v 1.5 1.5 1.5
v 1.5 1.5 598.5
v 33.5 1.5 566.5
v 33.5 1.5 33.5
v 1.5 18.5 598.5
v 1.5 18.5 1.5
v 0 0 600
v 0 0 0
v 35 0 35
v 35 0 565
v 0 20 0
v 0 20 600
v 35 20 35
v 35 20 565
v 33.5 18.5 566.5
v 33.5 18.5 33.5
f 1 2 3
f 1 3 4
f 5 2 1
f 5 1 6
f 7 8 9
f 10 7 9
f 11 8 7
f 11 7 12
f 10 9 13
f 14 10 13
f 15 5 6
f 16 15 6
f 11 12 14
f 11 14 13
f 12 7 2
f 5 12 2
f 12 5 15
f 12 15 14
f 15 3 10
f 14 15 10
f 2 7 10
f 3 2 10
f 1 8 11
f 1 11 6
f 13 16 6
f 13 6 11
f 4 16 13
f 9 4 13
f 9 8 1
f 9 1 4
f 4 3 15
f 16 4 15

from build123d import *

# Parameters (mm, degrees)
ESQUISSE1_W             = 35
ESQUISSE1_H             = 20
ESQUISSE1_W_2           = 32
ESQUISSE1_H_2           = 17
BOSS_EXTRU_1_DEPTH      = 600
ENL_V_MAT_EXTRU_1_DEPTH = 602.352641966
ENL_V_MAT_EXTRU_3_DEPTH = 602.352641966


with BuildPart() as part:
    # Esquisse1 → Boss.-Extru.1 (new body)
    with BuildSketch(Plane.XY):
        with Locations((17.5, 10)):
            Rectangle(ESQUISSE1_W, ESQUISSE1_H)
        with Locations((17.5, 10)):
            Rectangle(ESQUISSE1_W_2, ESQUISSE1_H_2, mode=Mode.SUBTRACT)
    extrude(amount=BOSS_EXTRU_1_DEPTH)

    # Esquisse2 → Enlèv. mat.-Extru.1 (cut, through all)
    with BuildSketch(Plane(origin=(0, 0, 0), x_dir=(1, 0, 0), z_dir=(0, 1, 0))):
        Polygon((0, -600), (35, -565), (35, -600), align=None)
    extrude(amount=ENL_V_MAT_EXTRU_1_DEPTH, mode=Mode.SUBTRACT)

    # Esquisse4 → Enlèv. mat.-Extru.3 (cut, through all)
    with BuildSketch(Plane(origin=(0, 0, 0), x_dir=(1, 0, 0), z_dir=(0, 1, 0))):
        Polygon((0, 0), (35, -35), (35, 0), align=None)
    extrude(amount=ENL_V_MAT_EXTRU_3_DEPTH, mode=Mode.SUBTRACT)


solid = part.part
